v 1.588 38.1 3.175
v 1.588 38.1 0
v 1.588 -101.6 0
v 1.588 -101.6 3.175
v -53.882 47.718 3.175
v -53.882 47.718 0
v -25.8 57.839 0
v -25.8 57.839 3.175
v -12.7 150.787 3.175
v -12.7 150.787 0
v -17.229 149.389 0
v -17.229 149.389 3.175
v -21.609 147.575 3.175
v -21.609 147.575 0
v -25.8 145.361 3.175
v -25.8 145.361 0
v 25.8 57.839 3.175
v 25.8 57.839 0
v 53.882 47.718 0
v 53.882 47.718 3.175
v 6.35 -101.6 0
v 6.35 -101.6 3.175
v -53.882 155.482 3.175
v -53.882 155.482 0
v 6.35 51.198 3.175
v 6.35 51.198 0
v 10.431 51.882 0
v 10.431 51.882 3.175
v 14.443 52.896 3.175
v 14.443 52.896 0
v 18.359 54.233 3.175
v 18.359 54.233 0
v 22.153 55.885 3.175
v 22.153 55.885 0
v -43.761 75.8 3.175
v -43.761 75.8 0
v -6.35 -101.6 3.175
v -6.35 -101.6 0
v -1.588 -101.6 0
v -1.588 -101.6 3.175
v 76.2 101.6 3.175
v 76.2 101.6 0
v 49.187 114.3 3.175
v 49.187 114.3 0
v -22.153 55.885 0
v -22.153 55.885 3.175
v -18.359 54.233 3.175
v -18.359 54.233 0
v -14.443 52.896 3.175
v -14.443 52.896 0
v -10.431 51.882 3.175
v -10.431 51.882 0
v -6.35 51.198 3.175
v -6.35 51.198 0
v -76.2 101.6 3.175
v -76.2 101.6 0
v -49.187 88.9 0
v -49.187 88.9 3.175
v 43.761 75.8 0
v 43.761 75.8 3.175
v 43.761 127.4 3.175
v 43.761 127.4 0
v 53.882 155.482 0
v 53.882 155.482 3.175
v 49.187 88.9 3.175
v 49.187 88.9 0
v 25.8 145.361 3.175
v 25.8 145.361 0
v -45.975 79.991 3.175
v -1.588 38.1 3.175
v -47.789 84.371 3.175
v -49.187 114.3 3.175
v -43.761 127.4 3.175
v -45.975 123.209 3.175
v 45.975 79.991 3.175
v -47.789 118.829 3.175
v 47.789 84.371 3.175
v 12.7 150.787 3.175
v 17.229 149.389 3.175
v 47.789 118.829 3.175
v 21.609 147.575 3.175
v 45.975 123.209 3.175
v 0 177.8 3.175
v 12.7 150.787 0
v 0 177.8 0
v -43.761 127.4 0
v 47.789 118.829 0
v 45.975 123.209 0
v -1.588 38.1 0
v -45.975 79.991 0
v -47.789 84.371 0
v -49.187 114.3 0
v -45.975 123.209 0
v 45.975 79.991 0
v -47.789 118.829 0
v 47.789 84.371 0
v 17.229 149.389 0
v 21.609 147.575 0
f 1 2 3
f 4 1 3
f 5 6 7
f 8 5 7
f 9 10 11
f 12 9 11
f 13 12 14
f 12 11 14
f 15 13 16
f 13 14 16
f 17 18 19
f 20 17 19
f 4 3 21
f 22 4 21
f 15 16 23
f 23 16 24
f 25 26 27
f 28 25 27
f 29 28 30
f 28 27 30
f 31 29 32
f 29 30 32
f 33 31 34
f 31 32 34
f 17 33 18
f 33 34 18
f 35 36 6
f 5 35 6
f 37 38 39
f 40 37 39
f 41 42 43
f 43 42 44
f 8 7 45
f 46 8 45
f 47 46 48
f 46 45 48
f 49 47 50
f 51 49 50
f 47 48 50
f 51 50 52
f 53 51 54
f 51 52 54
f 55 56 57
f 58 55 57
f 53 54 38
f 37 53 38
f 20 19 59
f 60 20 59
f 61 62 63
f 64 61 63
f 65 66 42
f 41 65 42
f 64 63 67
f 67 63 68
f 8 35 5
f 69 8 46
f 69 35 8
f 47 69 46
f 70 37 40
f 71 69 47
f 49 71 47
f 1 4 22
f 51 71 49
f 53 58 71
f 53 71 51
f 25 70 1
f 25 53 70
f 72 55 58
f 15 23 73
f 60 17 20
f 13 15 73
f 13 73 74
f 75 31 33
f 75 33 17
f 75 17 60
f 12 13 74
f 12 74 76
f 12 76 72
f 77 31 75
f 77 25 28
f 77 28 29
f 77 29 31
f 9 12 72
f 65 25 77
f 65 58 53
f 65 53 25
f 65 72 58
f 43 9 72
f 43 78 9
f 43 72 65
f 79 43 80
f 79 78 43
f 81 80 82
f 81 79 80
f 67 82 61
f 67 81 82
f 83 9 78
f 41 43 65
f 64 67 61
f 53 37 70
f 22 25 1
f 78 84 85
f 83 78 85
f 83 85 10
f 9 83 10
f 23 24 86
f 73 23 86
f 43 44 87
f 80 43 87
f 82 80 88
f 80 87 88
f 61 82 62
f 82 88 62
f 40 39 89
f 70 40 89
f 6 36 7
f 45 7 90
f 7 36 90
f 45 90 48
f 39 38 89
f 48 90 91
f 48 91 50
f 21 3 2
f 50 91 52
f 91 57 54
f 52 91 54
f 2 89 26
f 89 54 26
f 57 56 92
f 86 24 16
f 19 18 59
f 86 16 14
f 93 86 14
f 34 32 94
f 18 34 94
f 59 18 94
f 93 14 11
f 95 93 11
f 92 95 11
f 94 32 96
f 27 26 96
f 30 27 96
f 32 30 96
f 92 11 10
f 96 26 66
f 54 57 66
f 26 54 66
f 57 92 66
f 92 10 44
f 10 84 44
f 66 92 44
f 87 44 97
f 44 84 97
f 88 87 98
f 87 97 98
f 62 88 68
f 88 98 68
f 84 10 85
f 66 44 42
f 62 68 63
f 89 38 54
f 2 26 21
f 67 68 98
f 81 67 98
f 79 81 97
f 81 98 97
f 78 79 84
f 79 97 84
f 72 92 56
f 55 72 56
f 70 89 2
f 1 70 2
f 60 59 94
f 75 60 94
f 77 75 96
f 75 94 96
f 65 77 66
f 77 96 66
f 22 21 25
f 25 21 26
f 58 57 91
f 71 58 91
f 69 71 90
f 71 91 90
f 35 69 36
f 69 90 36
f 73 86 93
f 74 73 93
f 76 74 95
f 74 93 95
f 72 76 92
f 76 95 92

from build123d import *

# Parameters (mm, degrees)
F1_DEPTH = 3.175


with BuildPart() as f1:
    # F0 (on Top) → F1 (new body)
    with BuildSketch(Plane.XY):
        with BuildLine():
            Line((-6.35, 51.198438), (-6.35, -101.6))
            Line((-6.35, -101.6), (-1.5875, -101.6))
            Line((-1.5875, -101.6), (-1.5875, 38.1))
            Line((-1.5875, 38.1), (1.5875, 38.1))
            Line((1.5875, 38.1), (1.5875, -101.6))
            Line((1.5875, -101.6), (6.35, -101.6))
            Line((6.35, -101.6), (6.35, 51.198438))
            ThreePointArc((6.35, 51.198438), (16.414418, 53.524987), (25.800126, 57.839361))
            Line((25.800126, 57.839361), (53.881537, 47.718463))
            Line((53.881537, 47.718463), (43.760639, 75.799874))
            ThreePointArc((43.760639, 75.799874), (46.93308, 82.159682), (49.186888, 88.9))
            Line((49.186888, 88.9), (76.2, 101.6))
            Line((76.2, 101.6), (49.186888, 114.3))
            ThreePointArc((49.186888, 114.3), (46.93308, 121.040318), (43.760639, 127.400126))
            Line((43.760639, 127.400126), (53.881537, 155.481537))
            Line((53.881537, 155.481537), (25.800126, 145.360639))
            ThreePointArc((25.800126, 145.360639), (19.440318, 148.53308), (12.7, 150.786888))
            Line((12.7, 150.786888), (0, 177.8))
            Line((0, 177.8), (-12.7, 150.786888))
            ThreePointArc((-12.7, 150.786888), (-19.440318, 148.53308), (-25.800126, 145.360639))
            Line((-25.800126, 145.360639), (-53.881537, 155.481537))
            Line((-53.881537, 155.481537), (-43.760639, 127.400126))
            ThreePointArc((-43.760639, 127.400126), (-46.93308, 121.040318), (-49.186888, 114.3))
            Line((-49.186888, 114.3), (-76.2, 101.6))
            Line((-76.2, 101.6), (-49.186888, 88.9))
            ThreePointArc((-49.186888, 88.9), (-46.93308, 82.159682), (-43.760639, 75.799874))
            Line((-43.760639, 75.799874), (-53.881537, 47.718463))
            Line((-53.881537, 47.718463), (-25.800126, 57.839361))
            ThreePointArc((-25.800126, 57.839361), (-16.414418, 53.524987), (-6.35, 51.198438))
        make_face()
    extrude(amount=F1_DEPTH)


solid = f1.part
